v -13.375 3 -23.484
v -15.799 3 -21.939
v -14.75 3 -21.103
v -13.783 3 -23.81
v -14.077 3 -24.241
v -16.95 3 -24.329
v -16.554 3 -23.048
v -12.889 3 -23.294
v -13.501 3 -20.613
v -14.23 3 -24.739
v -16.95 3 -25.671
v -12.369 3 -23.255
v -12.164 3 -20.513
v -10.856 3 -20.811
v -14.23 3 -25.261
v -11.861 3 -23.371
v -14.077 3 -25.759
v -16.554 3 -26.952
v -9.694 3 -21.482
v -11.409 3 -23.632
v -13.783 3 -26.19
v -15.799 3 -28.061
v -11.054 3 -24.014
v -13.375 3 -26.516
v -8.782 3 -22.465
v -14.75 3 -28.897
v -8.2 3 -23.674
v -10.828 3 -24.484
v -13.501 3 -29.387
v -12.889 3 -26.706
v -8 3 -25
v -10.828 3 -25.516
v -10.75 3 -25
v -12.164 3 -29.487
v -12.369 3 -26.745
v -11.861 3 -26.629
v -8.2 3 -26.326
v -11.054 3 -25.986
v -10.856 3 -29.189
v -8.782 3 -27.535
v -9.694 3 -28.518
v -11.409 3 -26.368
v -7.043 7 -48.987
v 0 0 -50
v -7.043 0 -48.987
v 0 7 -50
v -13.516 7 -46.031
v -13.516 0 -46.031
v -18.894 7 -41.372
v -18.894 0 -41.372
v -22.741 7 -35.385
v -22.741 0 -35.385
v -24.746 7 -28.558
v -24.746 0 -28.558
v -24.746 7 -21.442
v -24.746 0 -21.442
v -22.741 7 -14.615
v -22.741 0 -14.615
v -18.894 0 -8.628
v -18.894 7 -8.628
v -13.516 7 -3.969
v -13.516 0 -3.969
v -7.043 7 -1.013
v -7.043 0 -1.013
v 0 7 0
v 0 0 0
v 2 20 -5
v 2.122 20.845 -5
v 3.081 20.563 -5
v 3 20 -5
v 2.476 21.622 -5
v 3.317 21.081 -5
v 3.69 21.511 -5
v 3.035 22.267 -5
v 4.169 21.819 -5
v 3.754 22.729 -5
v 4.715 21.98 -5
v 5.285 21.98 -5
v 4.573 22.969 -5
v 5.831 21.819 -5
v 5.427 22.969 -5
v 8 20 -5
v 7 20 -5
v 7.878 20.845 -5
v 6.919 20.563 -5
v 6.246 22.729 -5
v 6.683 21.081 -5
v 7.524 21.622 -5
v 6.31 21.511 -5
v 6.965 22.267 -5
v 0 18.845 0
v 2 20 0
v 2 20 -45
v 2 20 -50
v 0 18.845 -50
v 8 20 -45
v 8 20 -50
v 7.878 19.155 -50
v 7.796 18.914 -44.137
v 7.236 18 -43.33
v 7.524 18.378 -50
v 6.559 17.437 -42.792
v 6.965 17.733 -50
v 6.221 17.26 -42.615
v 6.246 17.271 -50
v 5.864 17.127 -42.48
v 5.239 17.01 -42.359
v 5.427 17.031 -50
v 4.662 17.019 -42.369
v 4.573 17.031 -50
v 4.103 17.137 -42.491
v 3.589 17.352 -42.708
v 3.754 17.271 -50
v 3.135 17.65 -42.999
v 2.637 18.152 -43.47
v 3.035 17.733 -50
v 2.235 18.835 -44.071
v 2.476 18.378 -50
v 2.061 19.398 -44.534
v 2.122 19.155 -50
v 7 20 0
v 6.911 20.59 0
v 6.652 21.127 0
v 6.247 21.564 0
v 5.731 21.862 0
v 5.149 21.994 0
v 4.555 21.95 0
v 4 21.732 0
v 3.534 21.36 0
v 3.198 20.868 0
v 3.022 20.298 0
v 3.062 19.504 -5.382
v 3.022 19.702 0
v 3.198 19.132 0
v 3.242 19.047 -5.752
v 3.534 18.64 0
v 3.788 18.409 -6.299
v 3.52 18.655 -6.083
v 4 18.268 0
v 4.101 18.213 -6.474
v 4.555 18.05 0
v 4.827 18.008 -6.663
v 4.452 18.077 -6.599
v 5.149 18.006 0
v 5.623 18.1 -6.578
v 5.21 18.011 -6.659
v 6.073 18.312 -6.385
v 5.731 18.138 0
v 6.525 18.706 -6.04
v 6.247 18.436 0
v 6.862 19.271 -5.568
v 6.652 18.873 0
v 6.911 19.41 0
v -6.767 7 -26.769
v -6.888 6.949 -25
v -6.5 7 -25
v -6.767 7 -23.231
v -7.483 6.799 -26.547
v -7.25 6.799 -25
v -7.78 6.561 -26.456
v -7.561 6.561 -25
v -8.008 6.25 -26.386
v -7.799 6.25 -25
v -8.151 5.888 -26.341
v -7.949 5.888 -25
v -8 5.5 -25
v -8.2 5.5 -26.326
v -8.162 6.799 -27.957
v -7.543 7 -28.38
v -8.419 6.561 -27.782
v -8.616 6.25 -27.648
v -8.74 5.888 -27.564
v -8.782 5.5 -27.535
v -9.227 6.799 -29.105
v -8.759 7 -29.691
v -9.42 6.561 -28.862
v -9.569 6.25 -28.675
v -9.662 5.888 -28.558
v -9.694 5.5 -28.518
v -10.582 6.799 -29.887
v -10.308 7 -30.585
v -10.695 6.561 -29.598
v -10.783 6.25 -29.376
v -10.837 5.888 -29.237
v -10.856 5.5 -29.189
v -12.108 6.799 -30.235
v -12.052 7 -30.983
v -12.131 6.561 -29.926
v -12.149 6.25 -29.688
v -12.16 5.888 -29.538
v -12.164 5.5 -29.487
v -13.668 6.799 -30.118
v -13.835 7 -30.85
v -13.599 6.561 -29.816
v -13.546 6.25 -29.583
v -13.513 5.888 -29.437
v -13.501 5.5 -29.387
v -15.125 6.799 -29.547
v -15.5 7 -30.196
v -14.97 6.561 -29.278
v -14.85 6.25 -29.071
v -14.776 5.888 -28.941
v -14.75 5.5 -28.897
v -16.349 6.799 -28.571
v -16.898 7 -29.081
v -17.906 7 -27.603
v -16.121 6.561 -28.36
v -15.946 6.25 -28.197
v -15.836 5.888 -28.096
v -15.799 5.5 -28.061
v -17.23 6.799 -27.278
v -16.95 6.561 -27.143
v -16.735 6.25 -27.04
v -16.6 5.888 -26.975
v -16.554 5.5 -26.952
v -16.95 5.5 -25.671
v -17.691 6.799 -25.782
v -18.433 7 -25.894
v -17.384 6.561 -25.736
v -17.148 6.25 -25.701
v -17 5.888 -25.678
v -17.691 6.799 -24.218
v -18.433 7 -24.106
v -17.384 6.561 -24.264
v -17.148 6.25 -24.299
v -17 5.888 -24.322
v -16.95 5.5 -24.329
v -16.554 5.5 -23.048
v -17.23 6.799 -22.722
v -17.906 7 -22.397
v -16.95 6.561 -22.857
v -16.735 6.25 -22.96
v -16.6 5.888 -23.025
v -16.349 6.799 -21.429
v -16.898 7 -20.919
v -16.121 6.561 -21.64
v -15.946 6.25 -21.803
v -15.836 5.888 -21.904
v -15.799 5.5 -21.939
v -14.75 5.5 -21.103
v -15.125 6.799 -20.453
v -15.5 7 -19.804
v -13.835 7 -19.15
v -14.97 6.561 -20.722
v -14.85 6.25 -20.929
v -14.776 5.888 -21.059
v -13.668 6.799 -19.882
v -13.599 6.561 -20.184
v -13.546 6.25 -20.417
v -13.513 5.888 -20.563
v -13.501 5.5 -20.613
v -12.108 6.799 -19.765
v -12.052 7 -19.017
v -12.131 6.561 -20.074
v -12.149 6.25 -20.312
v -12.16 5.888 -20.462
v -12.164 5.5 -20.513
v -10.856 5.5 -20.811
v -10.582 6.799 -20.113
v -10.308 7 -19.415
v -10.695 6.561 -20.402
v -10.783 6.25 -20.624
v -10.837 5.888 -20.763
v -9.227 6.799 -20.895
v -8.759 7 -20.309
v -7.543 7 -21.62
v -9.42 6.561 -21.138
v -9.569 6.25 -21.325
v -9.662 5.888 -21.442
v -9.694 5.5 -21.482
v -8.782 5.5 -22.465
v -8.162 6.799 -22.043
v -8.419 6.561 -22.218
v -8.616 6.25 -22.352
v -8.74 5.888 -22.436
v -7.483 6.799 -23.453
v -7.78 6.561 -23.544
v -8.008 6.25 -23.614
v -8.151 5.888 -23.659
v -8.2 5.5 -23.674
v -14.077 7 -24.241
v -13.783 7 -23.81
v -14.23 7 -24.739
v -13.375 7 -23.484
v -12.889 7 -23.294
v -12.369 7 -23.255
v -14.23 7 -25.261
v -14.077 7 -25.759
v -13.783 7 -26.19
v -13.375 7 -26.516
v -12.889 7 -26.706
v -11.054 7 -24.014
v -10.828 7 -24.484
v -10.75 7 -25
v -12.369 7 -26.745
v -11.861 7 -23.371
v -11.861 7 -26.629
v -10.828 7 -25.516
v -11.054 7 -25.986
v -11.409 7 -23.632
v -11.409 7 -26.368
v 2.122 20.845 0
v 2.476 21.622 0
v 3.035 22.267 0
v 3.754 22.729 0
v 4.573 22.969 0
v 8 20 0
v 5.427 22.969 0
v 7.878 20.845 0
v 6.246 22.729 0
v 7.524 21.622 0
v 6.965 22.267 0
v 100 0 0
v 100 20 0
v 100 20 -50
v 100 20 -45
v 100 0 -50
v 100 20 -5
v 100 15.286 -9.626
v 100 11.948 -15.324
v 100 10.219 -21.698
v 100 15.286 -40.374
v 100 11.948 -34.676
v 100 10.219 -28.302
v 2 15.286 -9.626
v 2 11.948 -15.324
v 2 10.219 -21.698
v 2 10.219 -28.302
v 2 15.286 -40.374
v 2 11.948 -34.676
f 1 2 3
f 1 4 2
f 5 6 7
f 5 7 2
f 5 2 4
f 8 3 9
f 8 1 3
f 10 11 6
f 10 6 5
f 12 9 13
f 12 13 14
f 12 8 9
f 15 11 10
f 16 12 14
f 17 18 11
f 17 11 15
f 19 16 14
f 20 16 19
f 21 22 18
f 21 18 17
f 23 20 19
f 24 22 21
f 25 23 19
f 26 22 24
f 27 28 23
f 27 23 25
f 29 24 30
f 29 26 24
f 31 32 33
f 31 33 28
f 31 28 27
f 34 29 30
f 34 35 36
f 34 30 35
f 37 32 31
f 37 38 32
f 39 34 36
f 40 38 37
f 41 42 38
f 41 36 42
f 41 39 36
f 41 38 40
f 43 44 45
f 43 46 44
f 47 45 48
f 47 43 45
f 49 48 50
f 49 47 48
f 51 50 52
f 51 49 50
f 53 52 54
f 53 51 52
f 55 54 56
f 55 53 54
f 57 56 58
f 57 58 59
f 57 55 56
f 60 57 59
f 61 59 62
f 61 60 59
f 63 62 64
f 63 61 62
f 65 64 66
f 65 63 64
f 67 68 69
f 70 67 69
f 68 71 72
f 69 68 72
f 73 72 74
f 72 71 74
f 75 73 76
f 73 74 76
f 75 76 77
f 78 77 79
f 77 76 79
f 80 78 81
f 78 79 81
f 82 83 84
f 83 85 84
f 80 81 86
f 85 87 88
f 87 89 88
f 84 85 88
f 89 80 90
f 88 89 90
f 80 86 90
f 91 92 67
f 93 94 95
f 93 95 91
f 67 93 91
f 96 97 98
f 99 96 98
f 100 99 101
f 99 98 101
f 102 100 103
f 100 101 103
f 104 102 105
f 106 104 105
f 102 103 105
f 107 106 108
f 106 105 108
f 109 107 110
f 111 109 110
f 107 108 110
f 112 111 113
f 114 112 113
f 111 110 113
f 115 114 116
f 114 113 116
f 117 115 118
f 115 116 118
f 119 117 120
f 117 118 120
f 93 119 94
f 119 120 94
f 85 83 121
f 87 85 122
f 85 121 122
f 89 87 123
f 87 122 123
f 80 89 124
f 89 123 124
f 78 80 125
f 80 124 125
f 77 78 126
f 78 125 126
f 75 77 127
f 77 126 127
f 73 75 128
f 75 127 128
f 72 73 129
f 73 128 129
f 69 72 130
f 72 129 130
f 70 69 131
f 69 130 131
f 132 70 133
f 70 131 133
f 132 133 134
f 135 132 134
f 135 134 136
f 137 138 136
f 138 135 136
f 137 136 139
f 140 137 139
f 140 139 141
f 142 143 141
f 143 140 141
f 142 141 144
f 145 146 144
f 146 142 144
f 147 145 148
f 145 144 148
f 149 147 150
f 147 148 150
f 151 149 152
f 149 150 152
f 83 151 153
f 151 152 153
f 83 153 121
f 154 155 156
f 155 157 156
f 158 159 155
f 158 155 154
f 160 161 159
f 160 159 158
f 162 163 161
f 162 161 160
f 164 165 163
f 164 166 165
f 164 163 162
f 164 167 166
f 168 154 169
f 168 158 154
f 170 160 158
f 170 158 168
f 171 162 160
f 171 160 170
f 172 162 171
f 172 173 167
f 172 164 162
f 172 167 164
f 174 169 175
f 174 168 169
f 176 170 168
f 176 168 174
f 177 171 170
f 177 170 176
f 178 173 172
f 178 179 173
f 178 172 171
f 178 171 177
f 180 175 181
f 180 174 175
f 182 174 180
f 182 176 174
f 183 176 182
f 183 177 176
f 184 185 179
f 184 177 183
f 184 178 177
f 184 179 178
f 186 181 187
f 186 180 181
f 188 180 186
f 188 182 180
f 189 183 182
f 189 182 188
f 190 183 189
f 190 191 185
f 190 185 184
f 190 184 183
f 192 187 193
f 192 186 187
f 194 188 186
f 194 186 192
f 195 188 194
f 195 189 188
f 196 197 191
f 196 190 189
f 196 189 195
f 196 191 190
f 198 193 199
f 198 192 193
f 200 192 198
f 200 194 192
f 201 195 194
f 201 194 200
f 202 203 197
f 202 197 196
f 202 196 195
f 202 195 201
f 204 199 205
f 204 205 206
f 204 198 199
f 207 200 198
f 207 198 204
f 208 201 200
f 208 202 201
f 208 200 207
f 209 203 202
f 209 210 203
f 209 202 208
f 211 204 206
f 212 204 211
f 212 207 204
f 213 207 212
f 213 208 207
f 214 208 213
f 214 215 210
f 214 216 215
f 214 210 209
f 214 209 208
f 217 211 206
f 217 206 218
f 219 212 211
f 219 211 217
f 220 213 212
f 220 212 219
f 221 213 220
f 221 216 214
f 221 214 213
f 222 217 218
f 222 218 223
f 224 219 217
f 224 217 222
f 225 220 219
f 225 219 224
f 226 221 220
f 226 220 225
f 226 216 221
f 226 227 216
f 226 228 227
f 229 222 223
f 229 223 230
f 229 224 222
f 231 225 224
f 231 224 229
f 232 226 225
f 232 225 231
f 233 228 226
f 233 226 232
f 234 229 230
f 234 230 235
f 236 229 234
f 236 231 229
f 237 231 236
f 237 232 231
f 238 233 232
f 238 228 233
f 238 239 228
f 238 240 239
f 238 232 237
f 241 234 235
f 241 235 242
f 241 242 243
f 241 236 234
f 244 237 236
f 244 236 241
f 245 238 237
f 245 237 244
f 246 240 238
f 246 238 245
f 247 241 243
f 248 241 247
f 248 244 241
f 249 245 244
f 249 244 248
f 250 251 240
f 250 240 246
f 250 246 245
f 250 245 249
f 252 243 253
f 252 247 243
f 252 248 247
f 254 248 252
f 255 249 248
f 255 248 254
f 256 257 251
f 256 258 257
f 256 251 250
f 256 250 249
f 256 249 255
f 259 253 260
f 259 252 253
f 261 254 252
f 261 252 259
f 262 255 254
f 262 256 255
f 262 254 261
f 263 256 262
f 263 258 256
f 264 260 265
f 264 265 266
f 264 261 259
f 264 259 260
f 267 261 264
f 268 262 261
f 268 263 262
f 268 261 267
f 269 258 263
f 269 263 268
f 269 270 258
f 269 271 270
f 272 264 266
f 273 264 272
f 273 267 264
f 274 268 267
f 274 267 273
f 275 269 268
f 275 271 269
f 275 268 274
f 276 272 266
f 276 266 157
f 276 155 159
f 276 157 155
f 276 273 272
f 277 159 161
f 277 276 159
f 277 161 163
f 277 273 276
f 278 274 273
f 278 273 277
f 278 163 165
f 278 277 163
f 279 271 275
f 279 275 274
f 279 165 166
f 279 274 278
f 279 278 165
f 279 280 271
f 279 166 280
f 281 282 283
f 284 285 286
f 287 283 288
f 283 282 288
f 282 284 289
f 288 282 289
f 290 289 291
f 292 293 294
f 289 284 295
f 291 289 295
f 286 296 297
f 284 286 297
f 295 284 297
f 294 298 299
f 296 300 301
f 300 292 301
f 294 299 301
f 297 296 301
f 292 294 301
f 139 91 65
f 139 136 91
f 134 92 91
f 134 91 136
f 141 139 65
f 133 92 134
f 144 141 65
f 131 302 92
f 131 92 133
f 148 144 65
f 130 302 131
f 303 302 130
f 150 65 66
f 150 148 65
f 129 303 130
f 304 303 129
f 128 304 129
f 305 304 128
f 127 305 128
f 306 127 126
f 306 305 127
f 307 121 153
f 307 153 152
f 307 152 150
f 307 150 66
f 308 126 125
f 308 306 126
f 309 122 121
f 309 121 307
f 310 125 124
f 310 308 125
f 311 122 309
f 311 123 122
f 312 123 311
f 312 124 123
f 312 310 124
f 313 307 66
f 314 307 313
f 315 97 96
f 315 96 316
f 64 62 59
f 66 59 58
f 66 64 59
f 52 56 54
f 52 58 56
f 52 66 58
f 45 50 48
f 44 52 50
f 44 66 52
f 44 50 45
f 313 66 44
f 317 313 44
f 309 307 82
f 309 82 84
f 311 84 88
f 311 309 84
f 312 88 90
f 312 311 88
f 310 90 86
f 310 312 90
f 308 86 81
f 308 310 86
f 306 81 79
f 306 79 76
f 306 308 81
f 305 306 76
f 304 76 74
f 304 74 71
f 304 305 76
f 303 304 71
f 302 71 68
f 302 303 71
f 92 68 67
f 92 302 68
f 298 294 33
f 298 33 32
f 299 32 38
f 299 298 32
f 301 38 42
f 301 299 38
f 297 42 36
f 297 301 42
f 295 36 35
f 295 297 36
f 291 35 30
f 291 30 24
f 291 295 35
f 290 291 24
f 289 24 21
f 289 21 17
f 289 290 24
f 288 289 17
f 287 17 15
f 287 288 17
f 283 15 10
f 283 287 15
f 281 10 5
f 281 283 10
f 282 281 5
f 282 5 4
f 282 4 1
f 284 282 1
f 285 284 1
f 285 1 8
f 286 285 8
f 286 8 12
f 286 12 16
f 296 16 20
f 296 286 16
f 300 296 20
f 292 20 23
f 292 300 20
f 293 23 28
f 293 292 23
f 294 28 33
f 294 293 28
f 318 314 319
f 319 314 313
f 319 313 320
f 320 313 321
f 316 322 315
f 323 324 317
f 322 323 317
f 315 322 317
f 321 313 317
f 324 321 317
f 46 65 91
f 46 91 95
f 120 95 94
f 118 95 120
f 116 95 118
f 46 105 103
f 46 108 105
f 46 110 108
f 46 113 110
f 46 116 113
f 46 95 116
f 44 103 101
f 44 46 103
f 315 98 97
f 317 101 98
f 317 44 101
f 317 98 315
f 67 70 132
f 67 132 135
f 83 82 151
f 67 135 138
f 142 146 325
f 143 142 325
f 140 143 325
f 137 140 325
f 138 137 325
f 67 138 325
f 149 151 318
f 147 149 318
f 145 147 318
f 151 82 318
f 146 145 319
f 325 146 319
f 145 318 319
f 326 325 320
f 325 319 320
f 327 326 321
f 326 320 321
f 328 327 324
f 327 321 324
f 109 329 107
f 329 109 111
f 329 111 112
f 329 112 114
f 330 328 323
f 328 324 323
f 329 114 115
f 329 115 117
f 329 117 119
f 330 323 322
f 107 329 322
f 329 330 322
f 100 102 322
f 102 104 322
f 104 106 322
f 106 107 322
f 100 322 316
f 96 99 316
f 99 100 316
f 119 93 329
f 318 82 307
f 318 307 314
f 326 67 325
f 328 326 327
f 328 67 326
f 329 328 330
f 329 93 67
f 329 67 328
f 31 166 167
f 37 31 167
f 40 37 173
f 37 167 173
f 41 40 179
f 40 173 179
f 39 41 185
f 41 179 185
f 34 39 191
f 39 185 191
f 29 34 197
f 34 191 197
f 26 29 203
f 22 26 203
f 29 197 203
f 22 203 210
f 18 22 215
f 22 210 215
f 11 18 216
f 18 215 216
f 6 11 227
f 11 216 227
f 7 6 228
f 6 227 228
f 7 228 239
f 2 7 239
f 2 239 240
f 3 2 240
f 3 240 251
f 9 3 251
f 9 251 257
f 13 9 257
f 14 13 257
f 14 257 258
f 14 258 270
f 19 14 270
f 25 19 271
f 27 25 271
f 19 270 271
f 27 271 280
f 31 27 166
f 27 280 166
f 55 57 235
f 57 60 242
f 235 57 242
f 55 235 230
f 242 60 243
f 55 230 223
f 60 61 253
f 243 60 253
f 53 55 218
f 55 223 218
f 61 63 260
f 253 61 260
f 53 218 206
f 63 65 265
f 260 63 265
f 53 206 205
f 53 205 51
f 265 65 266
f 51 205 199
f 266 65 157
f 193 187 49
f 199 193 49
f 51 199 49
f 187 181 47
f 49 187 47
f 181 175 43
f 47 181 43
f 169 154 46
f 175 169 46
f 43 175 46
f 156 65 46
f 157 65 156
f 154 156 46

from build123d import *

# Parameters (mm, degrees)
SKETCH1_W           = 100
SKETCH1_H           = 50
BOSS_EXTRUDE1_DEPTH = 20
SKETCH4_W           = 25
SKETCH4_H           = 7
CUT_EXTRUDE1_DEPTH  = 100
SKETCH5_R           = 4.5
SKETCH5_R_2         = 1.75
CUT_EXTRUDE2_DEPTH  = 4
FILLET2_R           = 1.5
SKETCH6_R           = 3
SKETCH6_R_2         = 2
BOSS_EXTRUDE3_DEPTH = 5
CUT_EXTRUDE3_DEPTH  = 10
SKETCH10_R          = 3
CUT_EXTRUDE4_DEPTH  = 10
CUT_EXTRUDE5_DEPTH  = 54
BOSS_EXTRUDE4_DEPTH = 50


with BuildPart() as part:
    # Sketch1 → Boss-Extrude1 (new body)
    with BuildSketch(Plane(origin=(0, 0, 0), x_dir=(1, 0, 0), z_dir=(0, 1, 0))):
        with Locations((50, 25)):
            Rectangle(SKETCH1_W, SKETCH1_H)
    extrude(amount=BOSS_EXTRUDE1_DEPTH)

    # Sketch4 → Revolve1 (revolve)
    with BuildSketch(Plane.ZY):
        with Locations((-12.5, 3.5)):
            Rectangle(SKETCH4_W, SKETCH4_H)
    revolve(axis=Axis((0, 0, -25), (0, 1, 0)))

    # Sketch2 → Cut-Extrude1 (cut)
    with BuildSketch(Plane(origin=(100, 0, 0), x_dir=(0, 0, -1), z_dir=(1, 0, 0))):
        with BuildLine():
            Line((45, 20), (5, 20))
            ThreePointArc((5, 20), (25, 10), (45, 20))
        make_face()
    extrude(amount=-CUT_EXTRUDE1_DEPTH, mode=Mode.SUBTRACT)

    # Sketch5 → Cut-Extrude2 (cut)
    with BuildSketch(Plane(origin=(0, 7, 0), x_dir=(1, 0, 0), z_dir=(0, 1, 0))):
        with Locations((-12.5, 25)):
            Circle(SKETCH5_R)
        with Locations((-12.5, 25)):
            Circle(SKETCH5_R_2, mode=Mode.SUBTRACT)
    extrude(amount=-CUT_EXTRUDE2_DEPTH, mode=Mode.SUBTRACT)

    # Fillet2
    fillet2_edges = [part.edges().sort_by_distance(p)[0] for p in [
        (-17, 7, -25),
    ]]
    fillet(fillet2_edges, radius=FILLET2_R)

    # Sketch6 → Boss-Extrude3 (add)
    with BuildSketch(Plane.XY):
        with Locations((5, 20)):
            Circle(SKETCH6_R)
        with Locations((5, 20)):
            Circle(SKETCH6_R_2, mode=Mode.SUBTRACT)
    extrude(amount=-BOSS_EXTRUDE3_DEPTH)

    # Sketch8 → Cut-Extrude3 (cut)
    with BuildSketch(Plane.XY):
        with BuildLine():
            Line((3, 20), (7, 20))
            ThreePointArc((7, 20), (5, 18), (3, 20))
        make_face()
    extrude(amount=-CUT_EXTRUDE3_DEPTH, mode=Mode.SUBTRACT)

    # Sketch10 → Cut-Extrude4 (cut)
    with BuildSketch(Plane(origin=(0, 0, -50), x_dir=(-1, 0, 0), z_dir=(0, 0, -1))):
        with Locations((-5, 20)):
            Circle(SKETCH10_R)
    extrude(amount=-CUT_EXTRUDE4_DEPTH, mode=Mode.SUBTRACT)

    # Sketch11 → Cut-Extrude5 (cut)
    with BuildSketch(Plane(origin=(0, 0, -50), x_dir=(-1, 0, 0), z_dir=(0, 0, -1))):
        Polygon((-2, 20), (0, 18.845299462), (0, 20), align=None)
    extrude(amount=-CUT_EXTRUDE5_DEPTH, mode=Mode.SUBTRACT)

    # Sketch12 → Boss-Extrude4 (add)
    with BuildSketch(Plane(origin=(0, 0, -50), x_dir=(-1, 0, 0), z_dir=(0, 0, -1))):
        Polygon((-2, 20), (-2, 0), (0, 0), (0, 18.845299462), align=None)
    extrude(amount=-BOSS_EXTRUDE4_DEPTH)


solid = part.part
